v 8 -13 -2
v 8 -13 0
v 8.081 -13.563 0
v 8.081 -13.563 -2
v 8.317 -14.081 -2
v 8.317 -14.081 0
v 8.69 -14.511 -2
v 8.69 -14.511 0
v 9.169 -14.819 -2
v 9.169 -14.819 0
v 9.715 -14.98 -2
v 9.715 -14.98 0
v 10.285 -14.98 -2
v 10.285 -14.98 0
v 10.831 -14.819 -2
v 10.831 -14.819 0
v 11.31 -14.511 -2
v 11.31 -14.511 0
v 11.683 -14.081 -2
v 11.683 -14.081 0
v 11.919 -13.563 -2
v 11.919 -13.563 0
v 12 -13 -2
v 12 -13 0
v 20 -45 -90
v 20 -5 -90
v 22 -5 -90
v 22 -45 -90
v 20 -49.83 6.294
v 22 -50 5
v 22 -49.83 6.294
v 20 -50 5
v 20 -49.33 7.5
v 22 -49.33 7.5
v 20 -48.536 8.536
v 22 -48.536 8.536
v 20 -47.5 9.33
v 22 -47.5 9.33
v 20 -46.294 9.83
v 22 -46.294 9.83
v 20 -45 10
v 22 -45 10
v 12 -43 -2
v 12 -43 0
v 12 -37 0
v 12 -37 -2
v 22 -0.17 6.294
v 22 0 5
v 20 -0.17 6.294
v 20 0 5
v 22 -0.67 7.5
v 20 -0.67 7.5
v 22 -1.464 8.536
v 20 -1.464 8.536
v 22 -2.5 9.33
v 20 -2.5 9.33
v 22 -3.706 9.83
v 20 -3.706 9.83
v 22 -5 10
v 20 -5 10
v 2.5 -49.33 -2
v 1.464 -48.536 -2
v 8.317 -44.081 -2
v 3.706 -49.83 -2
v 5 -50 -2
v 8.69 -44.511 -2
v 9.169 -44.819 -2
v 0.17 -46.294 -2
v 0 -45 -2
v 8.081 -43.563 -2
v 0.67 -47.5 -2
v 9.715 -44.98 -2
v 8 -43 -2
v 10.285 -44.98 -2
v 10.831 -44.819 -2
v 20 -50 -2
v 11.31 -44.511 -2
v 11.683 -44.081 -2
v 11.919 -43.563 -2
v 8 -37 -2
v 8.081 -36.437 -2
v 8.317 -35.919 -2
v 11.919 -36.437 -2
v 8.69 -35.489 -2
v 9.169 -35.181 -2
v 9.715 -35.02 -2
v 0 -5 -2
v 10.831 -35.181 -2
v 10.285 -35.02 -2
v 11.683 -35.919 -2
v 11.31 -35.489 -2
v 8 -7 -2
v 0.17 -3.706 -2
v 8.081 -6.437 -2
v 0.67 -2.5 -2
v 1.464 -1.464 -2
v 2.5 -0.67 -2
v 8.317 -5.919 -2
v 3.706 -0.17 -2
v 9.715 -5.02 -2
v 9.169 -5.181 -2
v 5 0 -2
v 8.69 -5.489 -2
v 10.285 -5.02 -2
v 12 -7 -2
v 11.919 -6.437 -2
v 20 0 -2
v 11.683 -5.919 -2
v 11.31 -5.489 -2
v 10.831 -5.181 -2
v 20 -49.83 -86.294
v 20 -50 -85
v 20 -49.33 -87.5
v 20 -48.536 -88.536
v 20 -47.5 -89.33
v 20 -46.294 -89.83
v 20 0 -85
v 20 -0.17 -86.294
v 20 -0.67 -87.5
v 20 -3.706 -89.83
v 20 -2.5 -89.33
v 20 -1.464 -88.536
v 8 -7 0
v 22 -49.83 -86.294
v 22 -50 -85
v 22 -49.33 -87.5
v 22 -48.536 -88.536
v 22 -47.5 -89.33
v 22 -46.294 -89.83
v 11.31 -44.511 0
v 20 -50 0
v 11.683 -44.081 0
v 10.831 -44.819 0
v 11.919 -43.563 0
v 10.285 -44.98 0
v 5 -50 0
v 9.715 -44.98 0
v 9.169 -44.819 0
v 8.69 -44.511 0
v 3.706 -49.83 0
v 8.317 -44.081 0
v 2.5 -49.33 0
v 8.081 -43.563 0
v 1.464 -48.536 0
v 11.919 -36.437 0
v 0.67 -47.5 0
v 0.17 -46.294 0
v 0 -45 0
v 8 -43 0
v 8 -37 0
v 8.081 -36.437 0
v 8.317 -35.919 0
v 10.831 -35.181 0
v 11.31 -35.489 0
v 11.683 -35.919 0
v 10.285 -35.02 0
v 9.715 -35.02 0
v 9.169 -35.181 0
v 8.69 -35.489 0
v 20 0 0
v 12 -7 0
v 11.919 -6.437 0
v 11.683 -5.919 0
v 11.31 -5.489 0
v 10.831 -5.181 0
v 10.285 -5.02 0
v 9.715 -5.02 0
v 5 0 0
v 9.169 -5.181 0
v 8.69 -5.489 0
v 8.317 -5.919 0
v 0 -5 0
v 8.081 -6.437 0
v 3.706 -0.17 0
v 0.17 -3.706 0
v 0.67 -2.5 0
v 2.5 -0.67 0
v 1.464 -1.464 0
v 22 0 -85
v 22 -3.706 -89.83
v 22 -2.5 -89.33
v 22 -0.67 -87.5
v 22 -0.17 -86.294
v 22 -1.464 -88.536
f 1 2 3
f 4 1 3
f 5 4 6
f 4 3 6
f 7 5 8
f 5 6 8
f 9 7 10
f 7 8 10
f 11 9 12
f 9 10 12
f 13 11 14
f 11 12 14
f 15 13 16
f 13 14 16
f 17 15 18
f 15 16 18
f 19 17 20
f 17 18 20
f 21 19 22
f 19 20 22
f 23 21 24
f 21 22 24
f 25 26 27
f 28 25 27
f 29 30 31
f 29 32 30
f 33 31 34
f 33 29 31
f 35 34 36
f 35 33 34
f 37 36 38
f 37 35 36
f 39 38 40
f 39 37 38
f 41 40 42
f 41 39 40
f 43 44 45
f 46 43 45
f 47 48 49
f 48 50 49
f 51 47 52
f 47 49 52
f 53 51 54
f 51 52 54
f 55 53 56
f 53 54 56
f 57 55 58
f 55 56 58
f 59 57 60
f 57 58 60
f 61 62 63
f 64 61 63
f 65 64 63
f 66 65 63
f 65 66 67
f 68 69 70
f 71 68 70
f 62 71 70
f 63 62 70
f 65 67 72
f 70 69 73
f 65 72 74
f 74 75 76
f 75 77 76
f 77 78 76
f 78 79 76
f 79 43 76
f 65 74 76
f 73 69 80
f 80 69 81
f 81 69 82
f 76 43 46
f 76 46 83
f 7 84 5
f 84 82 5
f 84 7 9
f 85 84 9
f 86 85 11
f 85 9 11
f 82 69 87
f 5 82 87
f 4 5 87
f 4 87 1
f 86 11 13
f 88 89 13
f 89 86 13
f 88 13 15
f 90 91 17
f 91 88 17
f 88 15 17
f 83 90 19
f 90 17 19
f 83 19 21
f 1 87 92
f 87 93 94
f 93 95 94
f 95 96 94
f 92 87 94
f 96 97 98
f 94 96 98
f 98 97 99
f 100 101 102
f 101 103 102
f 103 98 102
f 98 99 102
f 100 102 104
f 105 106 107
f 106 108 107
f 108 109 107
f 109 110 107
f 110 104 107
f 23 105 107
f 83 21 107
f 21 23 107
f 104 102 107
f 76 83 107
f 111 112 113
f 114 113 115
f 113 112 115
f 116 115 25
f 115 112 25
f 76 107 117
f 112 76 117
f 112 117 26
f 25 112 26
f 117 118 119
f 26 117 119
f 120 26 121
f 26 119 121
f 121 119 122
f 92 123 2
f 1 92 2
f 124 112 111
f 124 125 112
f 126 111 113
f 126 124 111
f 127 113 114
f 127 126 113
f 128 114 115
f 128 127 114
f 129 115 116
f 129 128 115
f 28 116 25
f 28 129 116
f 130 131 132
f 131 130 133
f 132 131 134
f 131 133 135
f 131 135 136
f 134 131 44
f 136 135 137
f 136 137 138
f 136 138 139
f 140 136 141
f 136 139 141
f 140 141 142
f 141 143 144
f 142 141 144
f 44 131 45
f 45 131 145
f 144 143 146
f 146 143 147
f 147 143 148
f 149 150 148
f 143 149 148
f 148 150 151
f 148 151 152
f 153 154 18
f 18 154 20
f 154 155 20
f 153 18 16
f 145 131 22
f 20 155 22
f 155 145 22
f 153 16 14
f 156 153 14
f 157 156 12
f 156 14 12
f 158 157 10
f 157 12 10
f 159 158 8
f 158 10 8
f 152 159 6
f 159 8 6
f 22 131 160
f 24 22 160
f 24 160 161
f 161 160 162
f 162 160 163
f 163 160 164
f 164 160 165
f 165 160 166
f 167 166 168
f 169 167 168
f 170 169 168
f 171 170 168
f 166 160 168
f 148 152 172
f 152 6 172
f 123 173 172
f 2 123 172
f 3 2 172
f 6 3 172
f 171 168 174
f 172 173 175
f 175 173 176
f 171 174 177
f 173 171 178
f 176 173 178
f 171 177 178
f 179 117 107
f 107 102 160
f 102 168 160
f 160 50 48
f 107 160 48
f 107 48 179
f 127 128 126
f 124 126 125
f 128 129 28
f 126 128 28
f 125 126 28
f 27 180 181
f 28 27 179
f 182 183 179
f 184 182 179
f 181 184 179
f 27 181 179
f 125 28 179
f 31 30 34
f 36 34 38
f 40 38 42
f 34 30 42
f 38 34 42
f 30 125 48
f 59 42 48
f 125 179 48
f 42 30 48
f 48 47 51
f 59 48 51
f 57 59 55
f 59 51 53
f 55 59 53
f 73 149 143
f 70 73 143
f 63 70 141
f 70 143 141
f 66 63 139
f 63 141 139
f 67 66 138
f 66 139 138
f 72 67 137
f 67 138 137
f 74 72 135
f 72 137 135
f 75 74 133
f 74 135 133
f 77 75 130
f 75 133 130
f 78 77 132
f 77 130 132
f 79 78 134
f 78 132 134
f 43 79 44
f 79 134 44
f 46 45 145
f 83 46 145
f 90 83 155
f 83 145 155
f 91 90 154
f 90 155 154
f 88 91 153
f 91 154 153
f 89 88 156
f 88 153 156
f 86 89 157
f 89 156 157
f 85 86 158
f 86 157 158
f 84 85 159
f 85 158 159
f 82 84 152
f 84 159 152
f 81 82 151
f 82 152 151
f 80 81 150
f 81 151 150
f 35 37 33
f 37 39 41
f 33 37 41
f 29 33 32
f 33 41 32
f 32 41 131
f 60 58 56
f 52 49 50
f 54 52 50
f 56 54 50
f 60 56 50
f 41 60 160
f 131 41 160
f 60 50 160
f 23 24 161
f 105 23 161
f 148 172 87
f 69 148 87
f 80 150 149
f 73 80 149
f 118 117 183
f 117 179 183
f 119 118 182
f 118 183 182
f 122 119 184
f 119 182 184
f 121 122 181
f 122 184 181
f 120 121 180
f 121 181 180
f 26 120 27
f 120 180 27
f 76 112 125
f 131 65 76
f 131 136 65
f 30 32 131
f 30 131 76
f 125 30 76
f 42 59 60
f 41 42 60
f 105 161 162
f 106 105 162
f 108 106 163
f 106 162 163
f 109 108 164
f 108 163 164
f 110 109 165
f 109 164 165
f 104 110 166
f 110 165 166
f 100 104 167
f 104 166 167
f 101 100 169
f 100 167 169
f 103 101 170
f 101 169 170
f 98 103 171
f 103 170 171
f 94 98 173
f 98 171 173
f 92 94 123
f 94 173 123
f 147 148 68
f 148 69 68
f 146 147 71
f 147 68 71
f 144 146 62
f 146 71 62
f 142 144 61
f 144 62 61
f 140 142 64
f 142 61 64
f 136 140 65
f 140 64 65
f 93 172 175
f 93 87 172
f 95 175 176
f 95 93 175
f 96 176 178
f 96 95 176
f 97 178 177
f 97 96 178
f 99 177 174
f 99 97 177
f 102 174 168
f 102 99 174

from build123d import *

# Parameters (mm, degrees)
F1_DEPTH = 50
F3_DEPTH = 25
F4_R     = 5


# Not quite as in the source:
# - a feature names something its author has since deleted; it is built from what else it names


with BuildPart() as f1:
    # F0 (on Front) → F1 (new body)
    with BuildSketch(Plane.XZ):
        Polygon((0, 0), (0, -2), (20, -2), (20, -90), (22, -90), (22, 10), (20, 10), (20, 0), align=None)
    extrude(amount=F1_DEPTH)

    # F2 (on face) → F3 (cut)
    with BuildSketch(Plane.XY):
        with BuildLine():
            ThreePointArc((12, -7), (10, -5), (8, -7))
            Line((8, -7), (8, -13))
            ThreePointArc((8, -13), (10, -15), (12, -13))
            Line((12, -13), (12, -7))
        make_face()
        with BuildLine():
            ThreePointArc((8, -43), (10, -45), (12, -43))
            Line((12, -43), (12, -37))
            ThreePointArc((12, -37), (10, -35), (8, -37))
            Line((8, -37), (8, -43))
        make_face()
    extrude(amount=-F3_DEPTH, mode=Mode.SUBTRACT)

    # F4
    f4_edges = [f1.edges().sort_by_distance(p)[0] for p in [
        (21, -50, 10),
        (21, 0, 10),
        (21, -50, -90),
        (21, 0, -90),
        (0, -50, -1),
        (0, 0, -1),
    ]]
    fillet(f4_edges, radius=F4_R)


solid = f1.part
